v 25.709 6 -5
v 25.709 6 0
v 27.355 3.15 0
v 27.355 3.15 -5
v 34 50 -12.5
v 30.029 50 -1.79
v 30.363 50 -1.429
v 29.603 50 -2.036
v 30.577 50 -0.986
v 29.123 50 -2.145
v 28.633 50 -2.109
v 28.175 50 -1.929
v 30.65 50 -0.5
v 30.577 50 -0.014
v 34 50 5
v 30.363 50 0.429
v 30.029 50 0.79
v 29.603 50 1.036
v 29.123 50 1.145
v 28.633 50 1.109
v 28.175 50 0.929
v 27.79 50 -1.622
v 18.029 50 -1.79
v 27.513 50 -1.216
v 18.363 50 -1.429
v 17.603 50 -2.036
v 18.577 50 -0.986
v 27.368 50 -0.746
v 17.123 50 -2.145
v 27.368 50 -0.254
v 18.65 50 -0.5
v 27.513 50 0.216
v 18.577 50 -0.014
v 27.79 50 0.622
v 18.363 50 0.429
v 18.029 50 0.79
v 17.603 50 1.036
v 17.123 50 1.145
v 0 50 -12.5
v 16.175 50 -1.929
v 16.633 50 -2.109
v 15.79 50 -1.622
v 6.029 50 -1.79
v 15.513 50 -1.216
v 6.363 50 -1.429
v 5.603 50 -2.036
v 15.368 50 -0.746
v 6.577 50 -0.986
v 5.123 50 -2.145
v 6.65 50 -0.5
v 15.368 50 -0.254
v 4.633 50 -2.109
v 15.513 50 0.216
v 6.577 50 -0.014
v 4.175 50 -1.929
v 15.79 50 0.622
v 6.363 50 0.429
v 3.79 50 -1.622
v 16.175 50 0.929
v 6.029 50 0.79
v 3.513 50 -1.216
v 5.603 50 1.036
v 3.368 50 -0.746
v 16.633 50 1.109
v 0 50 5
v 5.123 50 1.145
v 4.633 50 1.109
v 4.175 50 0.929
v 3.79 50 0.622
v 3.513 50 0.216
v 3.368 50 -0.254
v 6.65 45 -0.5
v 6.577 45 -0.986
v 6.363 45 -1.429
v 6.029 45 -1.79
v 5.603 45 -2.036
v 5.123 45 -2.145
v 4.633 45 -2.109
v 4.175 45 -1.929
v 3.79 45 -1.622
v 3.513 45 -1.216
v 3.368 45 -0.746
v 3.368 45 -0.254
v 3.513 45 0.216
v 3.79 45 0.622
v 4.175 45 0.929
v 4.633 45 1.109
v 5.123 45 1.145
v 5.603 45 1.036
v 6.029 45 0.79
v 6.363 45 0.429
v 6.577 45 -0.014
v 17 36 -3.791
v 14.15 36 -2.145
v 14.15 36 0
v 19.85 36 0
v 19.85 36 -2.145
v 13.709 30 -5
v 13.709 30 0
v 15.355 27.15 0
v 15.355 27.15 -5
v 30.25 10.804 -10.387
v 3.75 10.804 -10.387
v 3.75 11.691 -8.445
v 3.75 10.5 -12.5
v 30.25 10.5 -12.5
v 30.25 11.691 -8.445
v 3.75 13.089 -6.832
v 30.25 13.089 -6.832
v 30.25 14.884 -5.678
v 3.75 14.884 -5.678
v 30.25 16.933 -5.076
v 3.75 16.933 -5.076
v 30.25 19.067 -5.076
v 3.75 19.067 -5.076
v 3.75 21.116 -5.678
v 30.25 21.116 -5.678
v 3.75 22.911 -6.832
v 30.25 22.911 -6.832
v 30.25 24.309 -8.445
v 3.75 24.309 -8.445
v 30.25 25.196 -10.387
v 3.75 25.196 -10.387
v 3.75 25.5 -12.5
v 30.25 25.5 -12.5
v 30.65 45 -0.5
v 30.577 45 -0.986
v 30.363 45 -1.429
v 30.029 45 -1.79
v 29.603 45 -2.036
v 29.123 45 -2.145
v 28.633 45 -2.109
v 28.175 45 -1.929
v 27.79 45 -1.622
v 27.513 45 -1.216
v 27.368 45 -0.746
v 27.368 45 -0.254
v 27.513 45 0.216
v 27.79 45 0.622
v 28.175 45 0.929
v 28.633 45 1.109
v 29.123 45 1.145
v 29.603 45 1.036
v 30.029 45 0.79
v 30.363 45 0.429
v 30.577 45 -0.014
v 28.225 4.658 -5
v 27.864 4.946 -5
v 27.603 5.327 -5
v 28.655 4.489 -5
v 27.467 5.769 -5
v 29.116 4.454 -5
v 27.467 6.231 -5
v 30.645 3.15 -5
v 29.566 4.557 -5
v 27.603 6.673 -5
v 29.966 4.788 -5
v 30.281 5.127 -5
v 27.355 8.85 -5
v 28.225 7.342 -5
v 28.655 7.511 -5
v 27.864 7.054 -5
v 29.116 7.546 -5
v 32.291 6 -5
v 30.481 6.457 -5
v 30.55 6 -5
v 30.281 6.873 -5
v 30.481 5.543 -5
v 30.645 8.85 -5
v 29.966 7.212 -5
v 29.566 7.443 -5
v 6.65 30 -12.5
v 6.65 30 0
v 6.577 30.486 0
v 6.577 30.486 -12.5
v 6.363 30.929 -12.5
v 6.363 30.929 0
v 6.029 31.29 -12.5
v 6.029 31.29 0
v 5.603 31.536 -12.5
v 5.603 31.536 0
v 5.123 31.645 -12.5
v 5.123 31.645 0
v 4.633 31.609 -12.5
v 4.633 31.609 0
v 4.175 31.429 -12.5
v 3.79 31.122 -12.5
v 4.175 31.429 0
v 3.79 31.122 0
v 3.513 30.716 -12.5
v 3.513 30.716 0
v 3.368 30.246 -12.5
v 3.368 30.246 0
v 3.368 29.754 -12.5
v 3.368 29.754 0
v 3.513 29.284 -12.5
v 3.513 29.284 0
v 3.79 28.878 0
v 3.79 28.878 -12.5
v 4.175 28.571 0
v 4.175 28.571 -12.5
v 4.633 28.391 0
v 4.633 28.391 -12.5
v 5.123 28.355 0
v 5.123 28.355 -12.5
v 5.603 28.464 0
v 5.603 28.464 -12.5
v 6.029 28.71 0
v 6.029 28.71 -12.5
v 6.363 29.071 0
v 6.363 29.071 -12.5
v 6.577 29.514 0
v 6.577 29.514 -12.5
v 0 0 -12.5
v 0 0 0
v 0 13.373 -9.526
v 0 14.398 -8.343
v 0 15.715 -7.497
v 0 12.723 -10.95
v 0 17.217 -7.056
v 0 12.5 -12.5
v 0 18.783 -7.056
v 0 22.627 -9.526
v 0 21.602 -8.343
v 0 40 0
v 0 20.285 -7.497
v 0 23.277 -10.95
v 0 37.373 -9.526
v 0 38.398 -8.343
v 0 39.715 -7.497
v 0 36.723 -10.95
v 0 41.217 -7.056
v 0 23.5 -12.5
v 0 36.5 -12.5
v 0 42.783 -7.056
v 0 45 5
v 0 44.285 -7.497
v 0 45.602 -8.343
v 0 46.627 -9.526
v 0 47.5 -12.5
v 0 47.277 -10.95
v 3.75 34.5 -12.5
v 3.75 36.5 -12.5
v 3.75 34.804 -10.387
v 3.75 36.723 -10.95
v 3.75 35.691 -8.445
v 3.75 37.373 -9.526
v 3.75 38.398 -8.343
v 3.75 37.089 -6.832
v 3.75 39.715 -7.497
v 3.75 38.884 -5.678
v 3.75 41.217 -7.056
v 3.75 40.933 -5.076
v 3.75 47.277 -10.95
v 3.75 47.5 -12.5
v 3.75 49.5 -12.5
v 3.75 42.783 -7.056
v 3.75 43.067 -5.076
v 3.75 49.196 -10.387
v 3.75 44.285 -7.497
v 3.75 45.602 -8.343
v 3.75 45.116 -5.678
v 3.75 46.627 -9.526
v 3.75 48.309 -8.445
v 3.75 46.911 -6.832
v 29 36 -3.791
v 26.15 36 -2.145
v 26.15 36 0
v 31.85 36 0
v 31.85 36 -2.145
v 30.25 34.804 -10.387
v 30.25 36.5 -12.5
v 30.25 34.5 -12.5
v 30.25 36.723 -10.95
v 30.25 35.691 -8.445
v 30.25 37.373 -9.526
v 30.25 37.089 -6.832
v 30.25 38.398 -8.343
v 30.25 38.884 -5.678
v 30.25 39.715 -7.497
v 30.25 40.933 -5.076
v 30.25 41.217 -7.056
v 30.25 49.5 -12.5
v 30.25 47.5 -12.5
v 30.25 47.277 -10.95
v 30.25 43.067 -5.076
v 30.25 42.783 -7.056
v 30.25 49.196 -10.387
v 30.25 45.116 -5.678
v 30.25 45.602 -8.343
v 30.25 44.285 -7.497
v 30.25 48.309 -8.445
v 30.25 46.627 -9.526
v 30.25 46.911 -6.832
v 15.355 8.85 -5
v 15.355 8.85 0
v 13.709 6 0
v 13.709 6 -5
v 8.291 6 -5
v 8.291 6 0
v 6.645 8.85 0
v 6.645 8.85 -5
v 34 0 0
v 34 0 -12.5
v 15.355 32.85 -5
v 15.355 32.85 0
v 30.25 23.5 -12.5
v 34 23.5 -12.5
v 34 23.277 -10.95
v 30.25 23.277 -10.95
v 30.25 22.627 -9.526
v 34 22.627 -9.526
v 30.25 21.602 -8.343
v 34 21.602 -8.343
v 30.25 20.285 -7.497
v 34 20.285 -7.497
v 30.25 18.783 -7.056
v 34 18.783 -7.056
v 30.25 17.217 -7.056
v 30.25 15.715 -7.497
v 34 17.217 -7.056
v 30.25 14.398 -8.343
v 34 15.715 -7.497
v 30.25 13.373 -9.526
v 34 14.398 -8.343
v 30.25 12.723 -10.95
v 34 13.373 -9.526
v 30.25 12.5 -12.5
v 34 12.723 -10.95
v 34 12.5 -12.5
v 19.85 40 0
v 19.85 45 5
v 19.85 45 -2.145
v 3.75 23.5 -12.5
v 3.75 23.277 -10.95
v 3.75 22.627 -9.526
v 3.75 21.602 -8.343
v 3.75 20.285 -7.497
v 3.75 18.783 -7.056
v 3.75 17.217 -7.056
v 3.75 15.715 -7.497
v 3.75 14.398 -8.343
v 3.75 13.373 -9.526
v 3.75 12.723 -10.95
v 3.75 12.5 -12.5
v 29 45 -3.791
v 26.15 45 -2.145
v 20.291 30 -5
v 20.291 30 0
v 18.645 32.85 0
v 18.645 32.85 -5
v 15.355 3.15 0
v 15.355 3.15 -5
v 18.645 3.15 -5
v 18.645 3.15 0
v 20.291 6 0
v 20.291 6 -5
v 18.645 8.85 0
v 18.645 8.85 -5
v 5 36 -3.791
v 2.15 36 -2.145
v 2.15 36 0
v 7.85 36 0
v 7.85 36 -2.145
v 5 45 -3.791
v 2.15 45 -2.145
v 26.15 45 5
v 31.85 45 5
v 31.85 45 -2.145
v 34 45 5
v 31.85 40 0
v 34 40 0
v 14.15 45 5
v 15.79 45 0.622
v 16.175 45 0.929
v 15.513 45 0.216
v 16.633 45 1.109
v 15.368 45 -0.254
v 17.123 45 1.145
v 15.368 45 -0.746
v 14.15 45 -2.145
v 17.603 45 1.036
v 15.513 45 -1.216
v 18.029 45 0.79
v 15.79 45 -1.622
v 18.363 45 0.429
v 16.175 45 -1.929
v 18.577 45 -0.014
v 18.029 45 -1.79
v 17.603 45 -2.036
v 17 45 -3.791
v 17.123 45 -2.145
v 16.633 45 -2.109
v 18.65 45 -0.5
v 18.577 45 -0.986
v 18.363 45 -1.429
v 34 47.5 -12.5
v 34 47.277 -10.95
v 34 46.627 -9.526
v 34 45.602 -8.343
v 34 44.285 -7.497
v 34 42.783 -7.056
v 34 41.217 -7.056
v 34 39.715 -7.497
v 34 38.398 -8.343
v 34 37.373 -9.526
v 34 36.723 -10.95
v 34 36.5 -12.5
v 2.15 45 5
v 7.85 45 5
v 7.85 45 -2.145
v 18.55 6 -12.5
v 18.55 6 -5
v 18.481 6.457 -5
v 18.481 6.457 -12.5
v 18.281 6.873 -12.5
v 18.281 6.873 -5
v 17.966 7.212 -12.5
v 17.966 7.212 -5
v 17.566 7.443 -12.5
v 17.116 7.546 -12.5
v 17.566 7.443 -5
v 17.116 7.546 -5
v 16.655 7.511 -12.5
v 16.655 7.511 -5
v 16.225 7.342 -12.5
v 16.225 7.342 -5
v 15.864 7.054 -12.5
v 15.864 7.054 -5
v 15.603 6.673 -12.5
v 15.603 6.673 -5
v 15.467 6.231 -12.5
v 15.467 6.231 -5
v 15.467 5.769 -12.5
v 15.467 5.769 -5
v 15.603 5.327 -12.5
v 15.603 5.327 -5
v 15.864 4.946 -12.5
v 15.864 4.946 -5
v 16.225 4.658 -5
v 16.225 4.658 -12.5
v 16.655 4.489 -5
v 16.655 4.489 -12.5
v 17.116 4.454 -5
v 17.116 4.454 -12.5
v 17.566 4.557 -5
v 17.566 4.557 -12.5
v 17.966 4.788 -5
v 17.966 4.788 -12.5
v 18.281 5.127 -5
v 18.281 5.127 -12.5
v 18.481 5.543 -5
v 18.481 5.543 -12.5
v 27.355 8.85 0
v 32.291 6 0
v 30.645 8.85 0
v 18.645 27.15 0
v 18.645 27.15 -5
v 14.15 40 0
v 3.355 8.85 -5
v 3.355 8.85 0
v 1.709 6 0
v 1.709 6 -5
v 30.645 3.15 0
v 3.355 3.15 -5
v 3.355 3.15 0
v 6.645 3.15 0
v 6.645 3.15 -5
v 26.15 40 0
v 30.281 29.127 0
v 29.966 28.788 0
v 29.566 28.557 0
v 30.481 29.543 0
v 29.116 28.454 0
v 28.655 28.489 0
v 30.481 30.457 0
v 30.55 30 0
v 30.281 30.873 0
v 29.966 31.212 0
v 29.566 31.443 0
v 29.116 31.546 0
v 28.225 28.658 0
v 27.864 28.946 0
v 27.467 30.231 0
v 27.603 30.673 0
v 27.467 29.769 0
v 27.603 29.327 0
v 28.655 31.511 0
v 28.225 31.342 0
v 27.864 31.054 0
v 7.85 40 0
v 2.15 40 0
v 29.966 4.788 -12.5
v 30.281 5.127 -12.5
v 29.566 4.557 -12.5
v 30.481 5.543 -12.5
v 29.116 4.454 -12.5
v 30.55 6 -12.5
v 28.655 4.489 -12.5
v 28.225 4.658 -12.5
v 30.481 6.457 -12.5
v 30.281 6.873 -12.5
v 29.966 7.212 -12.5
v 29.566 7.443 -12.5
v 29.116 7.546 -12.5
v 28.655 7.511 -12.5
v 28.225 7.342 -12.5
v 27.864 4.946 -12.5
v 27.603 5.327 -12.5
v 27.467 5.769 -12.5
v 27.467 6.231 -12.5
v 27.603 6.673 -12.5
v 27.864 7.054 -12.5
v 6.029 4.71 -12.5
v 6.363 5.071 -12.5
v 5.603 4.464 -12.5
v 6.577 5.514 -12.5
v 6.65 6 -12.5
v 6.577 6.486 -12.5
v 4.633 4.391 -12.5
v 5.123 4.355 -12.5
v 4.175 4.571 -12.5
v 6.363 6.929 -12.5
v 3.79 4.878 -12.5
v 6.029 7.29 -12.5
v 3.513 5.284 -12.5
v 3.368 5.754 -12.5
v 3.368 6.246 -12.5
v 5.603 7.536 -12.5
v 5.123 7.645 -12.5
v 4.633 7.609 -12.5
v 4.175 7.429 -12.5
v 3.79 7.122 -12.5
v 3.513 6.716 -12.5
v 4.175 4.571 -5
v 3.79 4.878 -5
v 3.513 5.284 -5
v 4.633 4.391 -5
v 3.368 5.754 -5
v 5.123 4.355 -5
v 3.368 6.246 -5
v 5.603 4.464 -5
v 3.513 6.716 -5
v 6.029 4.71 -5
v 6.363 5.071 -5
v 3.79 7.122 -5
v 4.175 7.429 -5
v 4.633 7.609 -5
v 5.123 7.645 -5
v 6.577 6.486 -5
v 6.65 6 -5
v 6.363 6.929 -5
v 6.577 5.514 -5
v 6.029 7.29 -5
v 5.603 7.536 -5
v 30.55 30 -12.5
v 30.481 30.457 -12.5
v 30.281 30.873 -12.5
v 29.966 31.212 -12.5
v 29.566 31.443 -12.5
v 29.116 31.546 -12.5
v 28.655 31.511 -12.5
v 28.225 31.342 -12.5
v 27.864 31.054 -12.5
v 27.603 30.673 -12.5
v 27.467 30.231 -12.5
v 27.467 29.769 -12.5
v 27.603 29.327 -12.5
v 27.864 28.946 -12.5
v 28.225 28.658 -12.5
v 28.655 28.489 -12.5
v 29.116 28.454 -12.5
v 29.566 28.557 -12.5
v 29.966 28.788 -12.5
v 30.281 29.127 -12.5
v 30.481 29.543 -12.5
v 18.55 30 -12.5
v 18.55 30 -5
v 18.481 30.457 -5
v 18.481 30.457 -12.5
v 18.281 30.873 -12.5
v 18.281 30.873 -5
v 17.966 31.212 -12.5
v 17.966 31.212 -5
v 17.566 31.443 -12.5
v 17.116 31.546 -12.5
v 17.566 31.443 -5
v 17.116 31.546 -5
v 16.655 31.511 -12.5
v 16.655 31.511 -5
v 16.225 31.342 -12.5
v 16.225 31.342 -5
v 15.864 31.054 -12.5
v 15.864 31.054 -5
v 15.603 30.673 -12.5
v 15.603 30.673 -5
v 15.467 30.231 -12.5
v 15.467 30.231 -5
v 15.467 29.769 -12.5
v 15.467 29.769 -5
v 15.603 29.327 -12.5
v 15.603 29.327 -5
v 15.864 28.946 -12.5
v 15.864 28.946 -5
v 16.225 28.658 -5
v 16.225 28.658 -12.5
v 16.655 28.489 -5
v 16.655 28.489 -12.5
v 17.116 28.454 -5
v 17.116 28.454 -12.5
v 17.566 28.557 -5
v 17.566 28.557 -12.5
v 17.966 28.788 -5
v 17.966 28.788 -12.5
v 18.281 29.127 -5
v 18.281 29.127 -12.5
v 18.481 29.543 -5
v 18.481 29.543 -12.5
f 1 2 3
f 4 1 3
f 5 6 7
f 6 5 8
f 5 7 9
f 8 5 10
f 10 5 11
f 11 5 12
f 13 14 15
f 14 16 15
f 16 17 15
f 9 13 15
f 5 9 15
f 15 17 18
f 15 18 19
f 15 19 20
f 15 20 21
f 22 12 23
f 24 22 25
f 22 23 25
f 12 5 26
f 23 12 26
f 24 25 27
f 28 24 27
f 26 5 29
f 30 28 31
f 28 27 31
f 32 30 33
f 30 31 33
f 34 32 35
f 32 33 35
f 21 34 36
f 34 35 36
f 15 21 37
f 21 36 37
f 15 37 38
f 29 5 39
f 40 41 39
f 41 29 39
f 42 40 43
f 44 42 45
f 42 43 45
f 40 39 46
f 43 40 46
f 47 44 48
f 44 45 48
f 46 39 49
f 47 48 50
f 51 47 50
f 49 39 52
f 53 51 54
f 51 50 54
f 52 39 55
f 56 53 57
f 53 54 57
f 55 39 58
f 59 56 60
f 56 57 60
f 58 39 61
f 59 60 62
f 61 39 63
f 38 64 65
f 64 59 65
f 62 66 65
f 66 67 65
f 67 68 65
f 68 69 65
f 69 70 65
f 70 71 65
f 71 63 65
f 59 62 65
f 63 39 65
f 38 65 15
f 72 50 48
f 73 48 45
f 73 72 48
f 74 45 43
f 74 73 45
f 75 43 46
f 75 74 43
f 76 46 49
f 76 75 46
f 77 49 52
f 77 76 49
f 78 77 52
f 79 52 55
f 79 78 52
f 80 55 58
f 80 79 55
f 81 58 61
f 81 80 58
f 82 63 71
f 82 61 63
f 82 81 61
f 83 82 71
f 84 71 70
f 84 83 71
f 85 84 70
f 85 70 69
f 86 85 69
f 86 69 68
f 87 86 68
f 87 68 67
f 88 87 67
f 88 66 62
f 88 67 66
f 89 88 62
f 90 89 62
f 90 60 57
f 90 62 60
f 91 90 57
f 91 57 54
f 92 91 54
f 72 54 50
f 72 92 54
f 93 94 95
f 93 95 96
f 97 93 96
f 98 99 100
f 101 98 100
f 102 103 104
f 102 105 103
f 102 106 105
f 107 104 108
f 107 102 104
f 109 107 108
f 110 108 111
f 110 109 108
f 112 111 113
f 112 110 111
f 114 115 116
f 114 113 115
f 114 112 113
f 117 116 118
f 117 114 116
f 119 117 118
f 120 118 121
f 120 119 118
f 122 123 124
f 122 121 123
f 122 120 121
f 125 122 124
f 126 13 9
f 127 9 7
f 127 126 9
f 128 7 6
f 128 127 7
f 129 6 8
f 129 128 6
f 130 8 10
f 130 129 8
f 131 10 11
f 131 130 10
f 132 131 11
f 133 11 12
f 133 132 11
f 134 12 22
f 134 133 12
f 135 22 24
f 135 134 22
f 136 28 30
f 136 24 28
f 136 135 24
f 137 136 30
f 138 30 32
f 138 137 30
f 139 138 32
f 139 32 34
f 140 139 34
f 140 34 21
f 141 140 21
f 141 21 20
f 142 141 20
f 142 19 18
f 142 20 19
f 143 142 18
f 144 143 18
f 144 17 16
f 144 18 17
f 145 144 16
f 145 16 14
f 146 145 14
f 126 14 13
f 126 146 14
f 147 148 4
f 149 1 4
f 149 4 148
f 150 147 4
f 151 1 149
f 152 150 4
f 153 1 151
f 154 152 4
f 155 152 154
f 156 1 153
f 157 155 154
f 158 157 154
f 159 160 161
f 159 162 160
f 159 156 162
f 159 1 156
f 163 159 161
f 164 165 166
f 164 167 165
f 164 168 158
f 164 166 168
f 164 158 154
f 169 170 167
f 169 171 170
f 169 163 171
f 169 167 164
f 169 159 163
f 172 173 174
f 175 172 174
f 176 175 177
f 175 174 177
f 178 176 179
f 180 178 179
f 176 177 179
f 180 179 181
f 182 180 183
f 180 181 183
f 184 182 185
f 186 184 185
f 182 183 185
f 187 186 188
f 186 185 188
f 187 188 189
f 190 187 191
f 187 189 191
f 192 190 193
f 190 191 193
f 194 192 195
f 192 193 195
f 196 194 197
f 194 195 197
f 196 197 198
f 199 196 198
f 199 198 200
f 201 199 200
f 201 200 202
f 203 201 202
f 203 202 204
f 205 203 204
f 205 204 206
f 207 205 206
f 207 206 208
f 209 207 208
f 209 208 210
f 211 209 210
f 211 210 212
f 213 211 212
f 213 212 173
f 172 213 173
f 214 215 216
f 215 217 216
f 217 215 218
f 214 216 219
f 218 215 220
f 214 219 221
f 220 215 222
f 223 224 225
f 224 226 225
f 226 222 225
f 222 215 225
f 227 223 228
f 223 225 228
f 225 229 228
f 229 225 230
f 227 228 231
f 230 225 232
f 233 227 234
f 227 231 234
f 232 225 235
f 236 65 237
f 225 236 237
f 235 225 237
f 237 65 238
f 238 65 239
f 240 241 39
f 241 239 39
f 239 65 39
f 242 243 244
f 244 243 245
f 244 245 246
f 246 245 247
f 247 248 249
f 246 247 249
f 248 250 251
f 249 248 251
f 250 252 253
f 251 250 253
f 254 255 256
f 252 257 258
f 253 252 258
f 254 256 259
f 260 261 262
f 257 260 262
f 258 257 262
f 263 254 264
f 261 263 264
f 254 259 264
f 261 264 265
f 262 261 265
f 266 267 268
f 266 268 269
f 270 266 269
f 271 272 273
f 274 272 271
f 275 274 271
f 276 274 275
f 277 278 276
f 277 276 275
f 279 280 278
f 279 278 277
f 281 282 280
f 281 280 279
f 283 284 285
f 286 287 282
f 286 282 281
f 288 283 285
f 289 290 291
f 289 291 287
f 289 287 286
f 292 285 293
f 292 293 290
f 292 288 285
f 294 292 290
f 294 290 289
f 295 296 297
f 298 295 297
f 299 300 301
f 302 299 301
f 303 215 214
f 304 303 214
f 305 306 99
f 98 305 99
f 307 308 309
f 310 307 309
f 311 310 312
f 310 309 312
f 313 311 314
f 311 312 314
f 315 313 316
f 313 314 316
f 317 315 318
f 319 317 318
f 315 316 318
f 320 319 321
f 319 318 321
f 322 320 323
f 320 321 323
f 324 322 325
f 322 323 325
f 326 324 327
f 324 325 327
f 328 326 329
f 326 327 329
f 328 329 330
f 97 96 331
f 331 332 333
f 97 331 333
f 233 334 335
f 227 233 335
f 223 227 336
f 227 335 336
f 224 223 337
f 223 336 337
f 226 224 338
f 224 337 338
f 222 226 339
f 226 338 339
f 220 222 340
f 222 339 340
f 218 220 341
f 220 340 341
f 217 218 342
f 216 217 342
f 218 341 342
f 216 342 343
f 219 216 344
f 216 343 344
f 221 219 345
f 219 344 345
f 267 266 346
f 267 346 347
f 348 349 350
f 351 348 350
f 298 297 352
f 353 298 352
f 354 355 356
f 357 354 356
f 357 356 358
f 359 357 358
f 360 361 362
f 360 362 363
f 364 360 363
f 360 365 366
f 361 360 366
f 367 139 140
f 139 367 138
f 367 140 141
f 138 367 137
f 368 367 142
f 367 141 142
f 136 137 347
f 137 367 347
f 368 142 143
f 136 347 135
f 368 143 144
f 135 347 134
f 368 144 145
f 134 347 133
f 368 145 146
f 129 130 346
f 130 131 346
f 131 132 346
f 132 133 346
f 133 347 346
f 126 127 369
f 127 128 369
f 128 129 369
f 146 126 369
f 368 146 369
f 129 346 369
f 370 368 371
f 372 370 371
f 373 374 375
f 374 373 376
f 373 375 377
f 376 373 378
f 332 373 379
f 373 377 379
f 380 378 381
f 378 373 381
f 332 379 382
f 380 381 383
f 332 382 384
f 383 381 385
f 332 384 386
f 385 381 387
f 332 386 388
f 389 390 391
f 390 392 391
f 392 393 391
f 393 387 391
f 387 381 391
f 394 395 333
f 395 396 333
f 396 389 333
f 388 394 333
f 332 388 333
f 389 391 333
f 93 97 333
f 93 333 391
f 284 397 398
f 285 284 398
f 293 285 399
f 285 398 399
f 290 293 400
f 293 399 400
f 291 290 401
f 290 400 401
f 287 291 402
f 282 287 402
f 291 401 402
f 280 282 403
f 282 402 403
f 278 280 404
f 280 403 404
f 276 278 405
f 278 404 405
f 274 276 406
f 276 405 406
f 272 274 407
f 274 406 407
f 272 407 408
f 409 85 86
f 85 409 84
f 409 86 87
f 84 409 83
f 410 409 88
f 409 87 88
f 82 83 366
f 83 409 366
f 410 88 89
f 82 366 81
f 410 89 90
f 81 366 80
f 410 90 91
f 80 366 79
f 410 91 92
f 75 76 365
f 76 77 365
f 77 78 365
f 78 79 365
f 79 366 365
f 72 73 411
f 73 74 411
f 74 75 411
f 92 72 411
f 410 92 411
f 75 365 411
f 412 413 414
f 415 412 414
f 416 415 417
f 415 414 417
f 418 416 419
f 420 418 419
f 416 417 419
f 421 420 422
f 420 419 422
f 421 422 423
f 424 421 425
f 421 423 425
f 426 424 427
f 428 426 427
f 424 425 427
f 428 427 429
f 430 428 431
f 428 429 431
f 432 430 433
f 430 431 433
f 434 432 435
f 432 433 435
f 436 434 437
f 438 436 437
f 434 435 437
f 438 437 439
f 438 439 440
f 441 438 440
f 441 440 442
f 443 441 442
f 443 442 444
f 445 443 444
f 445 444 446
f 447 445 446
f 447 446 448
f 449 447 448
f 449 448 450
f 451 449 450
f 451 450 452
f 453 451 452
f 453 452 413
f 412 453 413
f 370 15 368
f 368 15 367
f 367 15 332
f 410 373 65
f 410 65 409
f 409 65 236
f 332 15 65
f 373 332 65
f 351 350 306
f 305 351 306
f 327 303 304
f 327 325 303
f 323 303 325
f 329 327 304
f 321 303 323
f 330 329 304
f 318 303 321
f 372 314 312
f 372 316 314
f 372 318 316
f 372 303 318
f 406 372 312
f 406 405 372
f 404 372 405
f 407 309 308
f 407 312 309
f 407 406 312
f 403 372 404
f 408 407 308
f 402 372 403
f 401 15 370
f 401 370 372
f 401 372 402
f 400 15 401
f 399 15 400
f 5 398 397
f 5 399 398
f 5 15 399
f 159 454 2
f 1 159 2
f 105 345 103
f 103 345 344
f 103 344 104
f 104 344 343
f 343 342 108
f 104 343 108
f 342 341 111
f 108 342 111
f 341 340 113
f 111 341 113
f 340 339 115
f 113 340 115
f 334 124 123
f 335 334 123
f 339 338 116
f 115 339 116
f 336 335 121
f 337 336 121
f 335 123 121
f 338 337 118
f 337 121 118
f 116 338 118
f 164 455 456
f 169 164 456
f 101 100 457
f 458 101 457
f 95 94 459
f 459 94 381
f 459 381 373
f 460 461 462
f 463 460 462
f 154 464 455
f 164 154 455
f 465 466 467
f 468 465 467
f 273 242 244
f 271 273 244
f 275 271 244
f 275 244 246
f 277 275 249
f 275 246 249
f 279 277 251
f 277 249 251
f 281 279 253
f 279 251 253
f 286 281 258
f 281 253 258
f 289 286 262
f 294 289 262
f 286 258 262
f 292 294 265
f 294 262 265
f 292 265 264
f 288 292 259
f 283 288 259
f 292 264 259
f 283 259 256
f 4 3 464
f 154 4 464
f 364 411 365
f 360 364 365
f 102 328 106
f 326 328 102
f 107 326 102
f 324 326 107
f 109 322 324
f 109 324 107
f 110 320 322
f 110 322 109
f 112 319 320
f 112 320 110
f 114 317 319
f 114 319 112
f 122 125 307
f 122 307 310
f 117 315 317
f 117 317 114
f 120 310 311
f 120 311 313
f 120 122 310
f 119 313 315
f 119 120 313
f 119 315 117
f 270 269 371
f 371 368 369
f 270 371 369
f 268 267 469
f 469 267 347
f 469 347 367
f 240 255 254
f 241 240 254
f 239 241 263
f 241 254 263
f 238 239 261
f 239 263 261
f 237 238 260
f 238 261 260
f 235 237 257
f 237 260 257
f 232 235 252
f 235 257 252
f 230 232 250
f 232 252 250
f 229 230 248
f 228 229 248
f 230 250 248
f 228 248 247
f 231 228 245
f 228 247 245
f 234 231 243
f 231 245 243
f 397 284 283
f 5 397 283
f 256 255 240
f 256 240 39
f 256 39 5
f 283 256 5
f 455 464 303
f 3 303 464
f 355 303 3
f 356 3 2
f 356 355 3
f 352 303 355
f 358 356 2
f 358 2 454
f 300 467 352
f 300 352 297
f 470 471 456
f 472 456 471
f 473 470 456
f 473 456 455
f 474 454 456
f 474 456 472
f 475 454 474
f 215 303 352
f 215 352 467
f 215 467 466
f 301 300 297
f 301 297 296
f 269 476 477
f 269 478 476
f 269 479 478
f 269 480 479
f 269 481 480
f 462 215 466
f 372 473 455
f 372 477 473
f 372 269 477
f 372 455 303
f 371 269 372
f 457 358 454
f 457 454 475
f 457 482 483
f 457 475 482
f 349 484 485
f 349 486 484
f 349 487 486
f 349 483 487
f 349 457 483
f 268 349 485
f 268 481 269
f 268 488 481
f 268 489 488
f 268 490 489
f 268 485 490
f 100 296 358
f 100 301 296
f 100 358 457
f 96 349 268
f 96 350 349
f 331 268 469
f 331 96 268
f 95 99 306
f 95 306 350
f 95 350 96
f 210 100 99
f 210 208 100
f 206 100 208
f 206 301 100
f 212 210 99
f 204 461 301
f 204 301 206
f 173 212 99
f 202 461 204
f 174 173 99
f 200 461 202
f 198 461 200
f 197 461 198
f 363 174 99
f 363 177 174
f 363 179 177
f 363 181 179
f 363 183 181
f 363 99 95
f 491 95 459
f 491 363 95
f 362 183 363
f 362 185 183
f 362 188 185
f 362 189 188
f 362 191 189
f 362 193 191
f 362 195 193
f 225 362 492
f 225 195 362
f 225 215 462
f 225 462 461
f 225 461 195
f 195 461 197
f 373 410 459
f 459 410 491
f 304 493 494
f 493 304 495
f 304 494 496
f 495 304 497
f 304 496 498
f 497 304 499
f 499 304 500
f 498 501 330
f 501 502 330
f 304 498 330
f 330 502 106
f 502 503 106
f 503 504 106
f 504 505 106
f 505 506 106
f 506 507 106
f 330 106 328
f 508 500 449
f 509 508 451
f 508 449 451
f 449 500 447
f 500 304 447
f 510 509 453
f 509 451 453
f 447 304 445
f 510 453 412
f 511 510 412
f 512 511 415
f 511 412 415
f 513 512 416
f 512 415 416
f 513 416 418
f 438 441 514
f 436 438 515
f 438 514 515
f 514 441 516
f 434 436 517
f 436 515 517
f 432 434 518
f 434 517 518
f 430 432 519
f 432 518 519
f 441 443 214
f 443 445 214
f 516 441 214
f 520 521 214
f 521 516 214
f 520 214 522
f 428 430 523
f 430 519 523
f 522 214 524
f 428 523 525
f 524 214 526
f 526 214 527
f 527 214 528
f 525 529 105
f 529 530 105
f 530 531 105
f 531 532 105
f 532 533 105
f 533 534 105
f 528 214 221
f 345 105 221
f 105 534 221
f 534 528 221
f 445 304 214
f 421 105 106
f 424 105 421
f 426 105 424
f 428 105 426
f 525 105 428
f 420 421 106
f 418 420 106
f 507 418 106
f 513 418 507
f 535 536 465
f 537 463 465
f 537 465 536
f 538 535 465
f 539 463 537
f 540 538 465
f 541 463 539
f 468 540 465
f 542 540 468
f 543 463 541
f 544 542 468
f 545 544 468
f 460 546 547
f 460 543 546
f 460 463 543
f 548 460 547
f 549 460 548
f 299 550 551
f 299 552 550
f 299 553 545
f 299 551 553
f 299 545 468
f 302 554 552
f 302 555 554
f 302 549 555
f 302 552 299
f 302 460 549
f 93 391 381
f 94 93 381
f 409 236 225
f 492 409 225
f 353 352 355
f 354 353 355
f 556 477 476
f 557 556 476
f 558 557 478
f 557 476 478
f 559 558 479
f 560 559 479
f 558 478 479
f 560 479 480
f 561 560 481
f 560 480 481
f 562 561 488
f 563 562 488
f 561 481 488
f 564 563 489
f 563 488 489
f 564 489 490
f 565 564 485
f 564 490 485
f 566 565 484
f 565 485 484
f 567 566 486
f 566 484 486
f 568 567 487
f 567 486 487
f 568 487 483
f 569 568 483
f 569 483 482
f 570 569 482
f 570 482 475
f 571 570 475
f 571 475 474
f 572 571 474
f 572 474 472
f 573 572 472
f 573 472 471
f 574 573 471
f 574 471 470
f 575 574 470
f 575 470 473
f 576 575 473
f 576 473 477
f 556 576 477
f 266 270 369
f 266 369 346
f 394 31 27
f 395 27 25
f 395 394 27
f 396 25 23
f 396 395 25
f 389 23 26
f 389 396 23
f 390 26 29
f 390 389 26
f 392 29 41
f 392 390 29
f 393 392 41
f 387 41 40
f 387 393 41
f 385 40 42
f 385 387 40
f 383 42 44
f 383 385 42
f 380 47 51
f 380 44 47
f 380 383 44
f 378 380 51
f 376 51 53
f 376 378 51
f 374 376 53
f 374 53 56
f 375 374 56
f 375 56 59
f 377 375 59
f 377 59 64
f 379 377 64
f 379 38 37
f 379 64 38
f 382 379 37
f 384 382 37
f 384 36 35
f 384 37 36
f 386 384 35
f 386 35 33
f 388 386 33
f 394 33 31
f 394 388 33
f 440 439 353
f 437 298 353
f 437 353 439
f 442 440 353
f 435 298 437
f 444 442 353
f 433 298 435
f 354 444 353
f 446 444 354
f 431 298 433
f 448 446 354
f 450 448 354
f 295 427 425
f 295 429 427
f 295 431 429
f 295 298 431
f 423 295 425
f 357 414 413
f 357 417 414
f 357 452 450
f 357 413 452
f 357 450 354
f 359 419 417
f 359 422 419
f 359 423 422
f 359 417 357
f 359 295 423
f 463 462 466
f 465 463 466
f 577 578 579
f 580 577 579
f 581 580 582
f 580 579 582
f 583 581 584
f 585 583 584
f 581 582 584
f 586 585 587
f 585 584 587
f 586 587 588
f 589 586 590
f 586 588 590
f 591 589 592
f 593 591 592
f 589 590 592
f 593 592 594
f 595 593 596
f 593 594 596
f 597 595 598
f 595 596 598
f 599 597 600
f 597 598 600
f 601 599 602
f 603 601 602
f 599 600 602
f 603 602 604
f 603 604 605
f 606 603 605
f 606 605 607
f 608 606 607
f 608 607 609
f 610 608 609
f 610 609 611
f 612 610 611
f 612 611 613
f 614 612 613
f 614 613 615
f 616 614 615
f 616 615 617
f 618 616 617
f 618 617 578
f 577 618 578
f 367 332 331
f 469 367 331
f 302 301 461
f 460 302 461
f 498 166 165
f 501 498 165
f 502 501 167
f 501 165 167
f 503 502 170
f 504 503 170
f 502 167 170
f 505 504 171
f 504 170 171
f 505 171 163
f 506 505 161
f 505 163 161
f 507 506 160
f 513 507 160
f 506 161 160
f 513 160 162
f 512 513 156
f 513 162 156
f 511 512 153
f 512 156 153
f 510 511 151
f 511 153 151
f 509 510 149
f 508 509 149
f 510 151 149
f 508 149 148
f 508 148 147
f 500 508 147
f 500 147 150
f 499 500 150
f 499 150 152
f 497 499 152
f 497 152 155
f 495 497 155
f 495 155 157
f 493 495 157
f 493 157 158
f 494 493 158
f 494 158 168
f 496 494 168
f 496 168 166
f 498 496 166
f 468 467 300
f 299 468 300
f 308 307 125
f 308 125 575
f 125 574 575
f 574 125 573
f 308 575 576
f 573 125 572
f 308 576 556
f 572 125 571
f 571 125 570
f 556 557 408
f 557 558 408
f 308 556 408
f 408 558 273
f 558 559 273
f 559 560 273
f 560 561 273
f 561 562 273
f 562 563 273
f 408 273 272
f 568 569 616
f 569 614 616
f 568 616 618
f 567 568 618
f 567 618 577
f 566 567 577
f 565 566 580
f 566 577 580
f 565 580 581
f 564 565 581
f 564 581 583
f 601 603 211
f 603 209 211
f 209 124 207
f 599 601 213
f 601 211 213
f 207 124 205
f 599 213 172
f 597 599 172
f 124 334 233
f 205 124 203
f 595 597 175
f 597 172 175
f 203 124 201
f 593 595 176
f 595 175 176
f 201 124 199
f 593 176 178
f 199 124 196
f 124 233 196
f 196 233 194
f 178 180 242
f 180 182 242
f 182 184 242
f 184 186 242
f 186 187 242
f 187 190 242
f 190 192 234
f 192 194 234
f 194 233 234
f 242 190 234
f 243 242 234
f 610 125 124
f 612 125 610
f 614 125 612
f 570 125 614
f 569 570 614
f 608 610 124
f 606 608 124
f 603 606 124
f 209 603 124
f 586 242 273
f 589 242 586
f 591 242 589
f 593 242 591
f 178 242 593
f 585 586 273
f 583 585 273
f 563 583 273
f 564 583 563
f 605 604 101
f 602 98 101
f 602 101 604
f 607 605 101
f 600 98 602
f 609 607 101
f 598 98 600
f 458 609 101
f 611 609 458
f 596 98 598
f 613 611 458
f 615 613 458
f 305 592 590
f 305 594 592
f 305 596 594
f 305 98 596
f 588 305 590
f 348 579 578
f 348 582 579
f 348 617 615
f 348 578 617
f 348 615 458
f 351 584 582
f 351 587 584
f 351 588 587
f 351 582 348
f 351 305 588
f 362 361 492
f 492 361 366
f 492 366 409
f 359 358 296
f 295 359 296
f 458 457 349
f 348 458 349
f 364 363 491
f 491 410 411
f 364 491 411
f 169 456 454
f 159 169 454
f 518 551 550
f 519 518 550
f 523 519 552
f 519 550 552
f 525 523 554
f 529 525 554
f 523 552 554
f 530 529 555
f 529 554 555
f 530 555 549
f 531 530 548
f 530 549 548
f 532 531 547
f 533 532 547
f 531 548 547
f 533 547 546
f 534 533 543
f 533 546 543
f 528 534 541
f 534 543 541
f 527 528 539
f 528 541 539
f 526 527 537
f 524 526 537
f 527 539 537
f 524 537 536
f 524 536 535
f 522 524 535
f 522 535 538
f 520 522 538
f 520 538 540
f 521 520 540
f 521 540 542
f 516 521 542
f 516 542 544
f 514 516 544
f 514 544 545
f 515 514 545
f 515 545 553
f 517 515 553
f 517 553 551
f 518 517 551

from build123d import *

# Parameters (mm, degrees)
SKETCH_1_W          = 12.5
SKETCH_1_H          = 50
EXTRUDE_1_DEPTH     = 34
SKETCH_2_R          = 7.5
CUT_EXTRUDE_1_DEPTH = 13.25
SKETCH_3_R          = 1.55
SKETCH_3_R_2        = 1.65
CUT_EXTRUDE_2_DEPTH = 13.5
CUT_EXTRUDE_3_DEPTH = 5
SKETCH_5_R          = 5.5
CUT_EXTRUDE_4_DEPTH = 35
EXTRUDE_2_DEPTH     = 17
SKETCH_7_R          = 1.65
CUT_EXTRUDE_5_DEPTH = 6
CUT_EXTRUDE_6_DEPTH = 9


with BuildPart() as part:
    # 草图1 → 凸台-拉伸1 (new body)
    with BuildSketch(Plane(origin=(0, 0, 0), x_dir=(0, 0, -1), z_dir=(1, 0, 0))):
        with Locations((6.25, 25)):
            Rectangle(SKETCH_1_W, SKETCH_1_H)
    extrude(amount=EXTRUDE_1_DEPTH)

    # 草图2 → 切除-拉伸1 (cut, symmetric)
    with BuildSketch(Plane.ZY.offset(-17)):
        with Locations((-12.5, 18)):
            Circle(SKETCH_2_R)
        with Locations((-12.5, 42)):
            Circle(SKETCH_2_R)
    extrude(amount=CUT_EXTRUDE_1_DEPTH, both=True, mode=Mode.SUBTRACT)

    # 草图3 → 切除-拉伸2 (cut, through all)
    with BuildSketch(Plane.XY):
        with Locations((29, 30)):
            Circle(SKETCH_3_R)
        with Locations((5, 30)):
            Circle(SKETCH_3_R_2)
        with Locations((17, 30)):
            Circle(SKETCH_3_R)
        with Locations((5, 6)):
            Circle(SKETCH_3_R_2)
        with Locations((17, 6)):
            Circle(SKETCH_3_R)
        with Locations((29, 6)):
            Circle(SKETCH_3_R)
    extrude(amount=-CUT_EXTRUDE_2_DEPTH, mode=Mode.SUBTRACT)

    # 草图4 → 切除-拉伸3 (cut)
    with BuildSketch(Plane.XY):
        Polygon((18.645448267, 27.15), (20.290896534, 30), (18.645448267, 32.85), (15.354551733, 32.85), (13.709103466, 30), (15.354551733, 27.15), align=None)
        Polygon((18.645448267, 3.15), (20.290896534, 6), (18.645448267, 8.85), (15.354551733, 8.85), (13.709103466, 6), (15.354551733, 3.15), align=None)
        Polygon((30.645448267, 3.15), (32.290896534, 6), (30.645448267, 8.85), (27.354551733, 8.85), (25.709103466, 6), (27.354551733, 3.15), align=None)
        Polygon((6.645448267, 3.15), (8.290896534, 6), (6.645448267, 8.85), (3.354551733, 8.85), (1.709103466, 6), (3.354551733, 3.15), align=None)
    extrude(amount=-CUT_EXTRUDE_3_DEPTH, mode=Mode.SUBTRACT)

    # 草图5 → 切除-拉伸4 (cut, through all)
    with BuildSketch(Plane(origin=(34, 0, 0), x_dir=(0, 0, -1), z_dir=(1, 0, 0))):
        with Locations((12.5, 18)):
            Circle(SKETCH_5_R)
        with Locations((12.5, 42)):
            Circle(SKETCH_5_R)
    extrude(amount=-CUT_EXTRUDE_4_DEPTH, mode=Mode.SUBTRACT)

    # 草图6 → 凸台-拉伸2 (add, symmetric)
    with BuildSketch(Plane.ZY.offset(-17)):
        Polygon((0, 50), (5, 50), (5, 45), (0, 40), align=None)
    extrude(amount=EXTRUDE_2_DEPTH, both=True)

    # 草图7 → 切除-拉伸5 (cut, through all)
    with BuildSketch(Plane(origin=(0, 45, 0), x_dir=(1, 0, 0), z_dir=(0, 1, 0))):
        with Locations((5, 0.5)):
            Circle(SKETCH_7_R)
        with Locations((17, 0.5)):
            Circle(SKETCH_7_R)
        with Locations((29, 0.5)):
            Circle(SKETCH_7_R)
    extrude(amount=CUT_EXTRUDE_5_DEPTH, mode=Mode.SUBTRACT)

    # 草图8 → 切除-拉伸6 (cut)
    with BuildSketch(Plane(origin=(0, 45, 0), x_dir=(1, 0, 0), z_dir=(0, 1, 0))):
        Polygon((7.85, -0.590838694), (7.85, 2.145448267), (5, 3.790896534), (2.15, 2.145448267), (2.15, -0.481963635), (2.15, -5), (7.85, -5), align=None)
        Polygon((19.85, -0.590838694), (19.85, 2.145448267), (17, 3.790896534), (14.15, 2.145448267), (14.15, -0.481963635), (14.15, -5), (19.85, -5), align=None)
        Polygon((31.85, -0.590838694), (31.85, 2.145448267), (29, 3.790896534), (26.15, 2.145448267), (26.15, -0.481963635), (26.15, -5), (31.85, -5), align=None)
    extrude(amount=-CUT_EXTRUDE_6_DEPTH, mode=Mode.SUBTRACT)


solid = part.part
